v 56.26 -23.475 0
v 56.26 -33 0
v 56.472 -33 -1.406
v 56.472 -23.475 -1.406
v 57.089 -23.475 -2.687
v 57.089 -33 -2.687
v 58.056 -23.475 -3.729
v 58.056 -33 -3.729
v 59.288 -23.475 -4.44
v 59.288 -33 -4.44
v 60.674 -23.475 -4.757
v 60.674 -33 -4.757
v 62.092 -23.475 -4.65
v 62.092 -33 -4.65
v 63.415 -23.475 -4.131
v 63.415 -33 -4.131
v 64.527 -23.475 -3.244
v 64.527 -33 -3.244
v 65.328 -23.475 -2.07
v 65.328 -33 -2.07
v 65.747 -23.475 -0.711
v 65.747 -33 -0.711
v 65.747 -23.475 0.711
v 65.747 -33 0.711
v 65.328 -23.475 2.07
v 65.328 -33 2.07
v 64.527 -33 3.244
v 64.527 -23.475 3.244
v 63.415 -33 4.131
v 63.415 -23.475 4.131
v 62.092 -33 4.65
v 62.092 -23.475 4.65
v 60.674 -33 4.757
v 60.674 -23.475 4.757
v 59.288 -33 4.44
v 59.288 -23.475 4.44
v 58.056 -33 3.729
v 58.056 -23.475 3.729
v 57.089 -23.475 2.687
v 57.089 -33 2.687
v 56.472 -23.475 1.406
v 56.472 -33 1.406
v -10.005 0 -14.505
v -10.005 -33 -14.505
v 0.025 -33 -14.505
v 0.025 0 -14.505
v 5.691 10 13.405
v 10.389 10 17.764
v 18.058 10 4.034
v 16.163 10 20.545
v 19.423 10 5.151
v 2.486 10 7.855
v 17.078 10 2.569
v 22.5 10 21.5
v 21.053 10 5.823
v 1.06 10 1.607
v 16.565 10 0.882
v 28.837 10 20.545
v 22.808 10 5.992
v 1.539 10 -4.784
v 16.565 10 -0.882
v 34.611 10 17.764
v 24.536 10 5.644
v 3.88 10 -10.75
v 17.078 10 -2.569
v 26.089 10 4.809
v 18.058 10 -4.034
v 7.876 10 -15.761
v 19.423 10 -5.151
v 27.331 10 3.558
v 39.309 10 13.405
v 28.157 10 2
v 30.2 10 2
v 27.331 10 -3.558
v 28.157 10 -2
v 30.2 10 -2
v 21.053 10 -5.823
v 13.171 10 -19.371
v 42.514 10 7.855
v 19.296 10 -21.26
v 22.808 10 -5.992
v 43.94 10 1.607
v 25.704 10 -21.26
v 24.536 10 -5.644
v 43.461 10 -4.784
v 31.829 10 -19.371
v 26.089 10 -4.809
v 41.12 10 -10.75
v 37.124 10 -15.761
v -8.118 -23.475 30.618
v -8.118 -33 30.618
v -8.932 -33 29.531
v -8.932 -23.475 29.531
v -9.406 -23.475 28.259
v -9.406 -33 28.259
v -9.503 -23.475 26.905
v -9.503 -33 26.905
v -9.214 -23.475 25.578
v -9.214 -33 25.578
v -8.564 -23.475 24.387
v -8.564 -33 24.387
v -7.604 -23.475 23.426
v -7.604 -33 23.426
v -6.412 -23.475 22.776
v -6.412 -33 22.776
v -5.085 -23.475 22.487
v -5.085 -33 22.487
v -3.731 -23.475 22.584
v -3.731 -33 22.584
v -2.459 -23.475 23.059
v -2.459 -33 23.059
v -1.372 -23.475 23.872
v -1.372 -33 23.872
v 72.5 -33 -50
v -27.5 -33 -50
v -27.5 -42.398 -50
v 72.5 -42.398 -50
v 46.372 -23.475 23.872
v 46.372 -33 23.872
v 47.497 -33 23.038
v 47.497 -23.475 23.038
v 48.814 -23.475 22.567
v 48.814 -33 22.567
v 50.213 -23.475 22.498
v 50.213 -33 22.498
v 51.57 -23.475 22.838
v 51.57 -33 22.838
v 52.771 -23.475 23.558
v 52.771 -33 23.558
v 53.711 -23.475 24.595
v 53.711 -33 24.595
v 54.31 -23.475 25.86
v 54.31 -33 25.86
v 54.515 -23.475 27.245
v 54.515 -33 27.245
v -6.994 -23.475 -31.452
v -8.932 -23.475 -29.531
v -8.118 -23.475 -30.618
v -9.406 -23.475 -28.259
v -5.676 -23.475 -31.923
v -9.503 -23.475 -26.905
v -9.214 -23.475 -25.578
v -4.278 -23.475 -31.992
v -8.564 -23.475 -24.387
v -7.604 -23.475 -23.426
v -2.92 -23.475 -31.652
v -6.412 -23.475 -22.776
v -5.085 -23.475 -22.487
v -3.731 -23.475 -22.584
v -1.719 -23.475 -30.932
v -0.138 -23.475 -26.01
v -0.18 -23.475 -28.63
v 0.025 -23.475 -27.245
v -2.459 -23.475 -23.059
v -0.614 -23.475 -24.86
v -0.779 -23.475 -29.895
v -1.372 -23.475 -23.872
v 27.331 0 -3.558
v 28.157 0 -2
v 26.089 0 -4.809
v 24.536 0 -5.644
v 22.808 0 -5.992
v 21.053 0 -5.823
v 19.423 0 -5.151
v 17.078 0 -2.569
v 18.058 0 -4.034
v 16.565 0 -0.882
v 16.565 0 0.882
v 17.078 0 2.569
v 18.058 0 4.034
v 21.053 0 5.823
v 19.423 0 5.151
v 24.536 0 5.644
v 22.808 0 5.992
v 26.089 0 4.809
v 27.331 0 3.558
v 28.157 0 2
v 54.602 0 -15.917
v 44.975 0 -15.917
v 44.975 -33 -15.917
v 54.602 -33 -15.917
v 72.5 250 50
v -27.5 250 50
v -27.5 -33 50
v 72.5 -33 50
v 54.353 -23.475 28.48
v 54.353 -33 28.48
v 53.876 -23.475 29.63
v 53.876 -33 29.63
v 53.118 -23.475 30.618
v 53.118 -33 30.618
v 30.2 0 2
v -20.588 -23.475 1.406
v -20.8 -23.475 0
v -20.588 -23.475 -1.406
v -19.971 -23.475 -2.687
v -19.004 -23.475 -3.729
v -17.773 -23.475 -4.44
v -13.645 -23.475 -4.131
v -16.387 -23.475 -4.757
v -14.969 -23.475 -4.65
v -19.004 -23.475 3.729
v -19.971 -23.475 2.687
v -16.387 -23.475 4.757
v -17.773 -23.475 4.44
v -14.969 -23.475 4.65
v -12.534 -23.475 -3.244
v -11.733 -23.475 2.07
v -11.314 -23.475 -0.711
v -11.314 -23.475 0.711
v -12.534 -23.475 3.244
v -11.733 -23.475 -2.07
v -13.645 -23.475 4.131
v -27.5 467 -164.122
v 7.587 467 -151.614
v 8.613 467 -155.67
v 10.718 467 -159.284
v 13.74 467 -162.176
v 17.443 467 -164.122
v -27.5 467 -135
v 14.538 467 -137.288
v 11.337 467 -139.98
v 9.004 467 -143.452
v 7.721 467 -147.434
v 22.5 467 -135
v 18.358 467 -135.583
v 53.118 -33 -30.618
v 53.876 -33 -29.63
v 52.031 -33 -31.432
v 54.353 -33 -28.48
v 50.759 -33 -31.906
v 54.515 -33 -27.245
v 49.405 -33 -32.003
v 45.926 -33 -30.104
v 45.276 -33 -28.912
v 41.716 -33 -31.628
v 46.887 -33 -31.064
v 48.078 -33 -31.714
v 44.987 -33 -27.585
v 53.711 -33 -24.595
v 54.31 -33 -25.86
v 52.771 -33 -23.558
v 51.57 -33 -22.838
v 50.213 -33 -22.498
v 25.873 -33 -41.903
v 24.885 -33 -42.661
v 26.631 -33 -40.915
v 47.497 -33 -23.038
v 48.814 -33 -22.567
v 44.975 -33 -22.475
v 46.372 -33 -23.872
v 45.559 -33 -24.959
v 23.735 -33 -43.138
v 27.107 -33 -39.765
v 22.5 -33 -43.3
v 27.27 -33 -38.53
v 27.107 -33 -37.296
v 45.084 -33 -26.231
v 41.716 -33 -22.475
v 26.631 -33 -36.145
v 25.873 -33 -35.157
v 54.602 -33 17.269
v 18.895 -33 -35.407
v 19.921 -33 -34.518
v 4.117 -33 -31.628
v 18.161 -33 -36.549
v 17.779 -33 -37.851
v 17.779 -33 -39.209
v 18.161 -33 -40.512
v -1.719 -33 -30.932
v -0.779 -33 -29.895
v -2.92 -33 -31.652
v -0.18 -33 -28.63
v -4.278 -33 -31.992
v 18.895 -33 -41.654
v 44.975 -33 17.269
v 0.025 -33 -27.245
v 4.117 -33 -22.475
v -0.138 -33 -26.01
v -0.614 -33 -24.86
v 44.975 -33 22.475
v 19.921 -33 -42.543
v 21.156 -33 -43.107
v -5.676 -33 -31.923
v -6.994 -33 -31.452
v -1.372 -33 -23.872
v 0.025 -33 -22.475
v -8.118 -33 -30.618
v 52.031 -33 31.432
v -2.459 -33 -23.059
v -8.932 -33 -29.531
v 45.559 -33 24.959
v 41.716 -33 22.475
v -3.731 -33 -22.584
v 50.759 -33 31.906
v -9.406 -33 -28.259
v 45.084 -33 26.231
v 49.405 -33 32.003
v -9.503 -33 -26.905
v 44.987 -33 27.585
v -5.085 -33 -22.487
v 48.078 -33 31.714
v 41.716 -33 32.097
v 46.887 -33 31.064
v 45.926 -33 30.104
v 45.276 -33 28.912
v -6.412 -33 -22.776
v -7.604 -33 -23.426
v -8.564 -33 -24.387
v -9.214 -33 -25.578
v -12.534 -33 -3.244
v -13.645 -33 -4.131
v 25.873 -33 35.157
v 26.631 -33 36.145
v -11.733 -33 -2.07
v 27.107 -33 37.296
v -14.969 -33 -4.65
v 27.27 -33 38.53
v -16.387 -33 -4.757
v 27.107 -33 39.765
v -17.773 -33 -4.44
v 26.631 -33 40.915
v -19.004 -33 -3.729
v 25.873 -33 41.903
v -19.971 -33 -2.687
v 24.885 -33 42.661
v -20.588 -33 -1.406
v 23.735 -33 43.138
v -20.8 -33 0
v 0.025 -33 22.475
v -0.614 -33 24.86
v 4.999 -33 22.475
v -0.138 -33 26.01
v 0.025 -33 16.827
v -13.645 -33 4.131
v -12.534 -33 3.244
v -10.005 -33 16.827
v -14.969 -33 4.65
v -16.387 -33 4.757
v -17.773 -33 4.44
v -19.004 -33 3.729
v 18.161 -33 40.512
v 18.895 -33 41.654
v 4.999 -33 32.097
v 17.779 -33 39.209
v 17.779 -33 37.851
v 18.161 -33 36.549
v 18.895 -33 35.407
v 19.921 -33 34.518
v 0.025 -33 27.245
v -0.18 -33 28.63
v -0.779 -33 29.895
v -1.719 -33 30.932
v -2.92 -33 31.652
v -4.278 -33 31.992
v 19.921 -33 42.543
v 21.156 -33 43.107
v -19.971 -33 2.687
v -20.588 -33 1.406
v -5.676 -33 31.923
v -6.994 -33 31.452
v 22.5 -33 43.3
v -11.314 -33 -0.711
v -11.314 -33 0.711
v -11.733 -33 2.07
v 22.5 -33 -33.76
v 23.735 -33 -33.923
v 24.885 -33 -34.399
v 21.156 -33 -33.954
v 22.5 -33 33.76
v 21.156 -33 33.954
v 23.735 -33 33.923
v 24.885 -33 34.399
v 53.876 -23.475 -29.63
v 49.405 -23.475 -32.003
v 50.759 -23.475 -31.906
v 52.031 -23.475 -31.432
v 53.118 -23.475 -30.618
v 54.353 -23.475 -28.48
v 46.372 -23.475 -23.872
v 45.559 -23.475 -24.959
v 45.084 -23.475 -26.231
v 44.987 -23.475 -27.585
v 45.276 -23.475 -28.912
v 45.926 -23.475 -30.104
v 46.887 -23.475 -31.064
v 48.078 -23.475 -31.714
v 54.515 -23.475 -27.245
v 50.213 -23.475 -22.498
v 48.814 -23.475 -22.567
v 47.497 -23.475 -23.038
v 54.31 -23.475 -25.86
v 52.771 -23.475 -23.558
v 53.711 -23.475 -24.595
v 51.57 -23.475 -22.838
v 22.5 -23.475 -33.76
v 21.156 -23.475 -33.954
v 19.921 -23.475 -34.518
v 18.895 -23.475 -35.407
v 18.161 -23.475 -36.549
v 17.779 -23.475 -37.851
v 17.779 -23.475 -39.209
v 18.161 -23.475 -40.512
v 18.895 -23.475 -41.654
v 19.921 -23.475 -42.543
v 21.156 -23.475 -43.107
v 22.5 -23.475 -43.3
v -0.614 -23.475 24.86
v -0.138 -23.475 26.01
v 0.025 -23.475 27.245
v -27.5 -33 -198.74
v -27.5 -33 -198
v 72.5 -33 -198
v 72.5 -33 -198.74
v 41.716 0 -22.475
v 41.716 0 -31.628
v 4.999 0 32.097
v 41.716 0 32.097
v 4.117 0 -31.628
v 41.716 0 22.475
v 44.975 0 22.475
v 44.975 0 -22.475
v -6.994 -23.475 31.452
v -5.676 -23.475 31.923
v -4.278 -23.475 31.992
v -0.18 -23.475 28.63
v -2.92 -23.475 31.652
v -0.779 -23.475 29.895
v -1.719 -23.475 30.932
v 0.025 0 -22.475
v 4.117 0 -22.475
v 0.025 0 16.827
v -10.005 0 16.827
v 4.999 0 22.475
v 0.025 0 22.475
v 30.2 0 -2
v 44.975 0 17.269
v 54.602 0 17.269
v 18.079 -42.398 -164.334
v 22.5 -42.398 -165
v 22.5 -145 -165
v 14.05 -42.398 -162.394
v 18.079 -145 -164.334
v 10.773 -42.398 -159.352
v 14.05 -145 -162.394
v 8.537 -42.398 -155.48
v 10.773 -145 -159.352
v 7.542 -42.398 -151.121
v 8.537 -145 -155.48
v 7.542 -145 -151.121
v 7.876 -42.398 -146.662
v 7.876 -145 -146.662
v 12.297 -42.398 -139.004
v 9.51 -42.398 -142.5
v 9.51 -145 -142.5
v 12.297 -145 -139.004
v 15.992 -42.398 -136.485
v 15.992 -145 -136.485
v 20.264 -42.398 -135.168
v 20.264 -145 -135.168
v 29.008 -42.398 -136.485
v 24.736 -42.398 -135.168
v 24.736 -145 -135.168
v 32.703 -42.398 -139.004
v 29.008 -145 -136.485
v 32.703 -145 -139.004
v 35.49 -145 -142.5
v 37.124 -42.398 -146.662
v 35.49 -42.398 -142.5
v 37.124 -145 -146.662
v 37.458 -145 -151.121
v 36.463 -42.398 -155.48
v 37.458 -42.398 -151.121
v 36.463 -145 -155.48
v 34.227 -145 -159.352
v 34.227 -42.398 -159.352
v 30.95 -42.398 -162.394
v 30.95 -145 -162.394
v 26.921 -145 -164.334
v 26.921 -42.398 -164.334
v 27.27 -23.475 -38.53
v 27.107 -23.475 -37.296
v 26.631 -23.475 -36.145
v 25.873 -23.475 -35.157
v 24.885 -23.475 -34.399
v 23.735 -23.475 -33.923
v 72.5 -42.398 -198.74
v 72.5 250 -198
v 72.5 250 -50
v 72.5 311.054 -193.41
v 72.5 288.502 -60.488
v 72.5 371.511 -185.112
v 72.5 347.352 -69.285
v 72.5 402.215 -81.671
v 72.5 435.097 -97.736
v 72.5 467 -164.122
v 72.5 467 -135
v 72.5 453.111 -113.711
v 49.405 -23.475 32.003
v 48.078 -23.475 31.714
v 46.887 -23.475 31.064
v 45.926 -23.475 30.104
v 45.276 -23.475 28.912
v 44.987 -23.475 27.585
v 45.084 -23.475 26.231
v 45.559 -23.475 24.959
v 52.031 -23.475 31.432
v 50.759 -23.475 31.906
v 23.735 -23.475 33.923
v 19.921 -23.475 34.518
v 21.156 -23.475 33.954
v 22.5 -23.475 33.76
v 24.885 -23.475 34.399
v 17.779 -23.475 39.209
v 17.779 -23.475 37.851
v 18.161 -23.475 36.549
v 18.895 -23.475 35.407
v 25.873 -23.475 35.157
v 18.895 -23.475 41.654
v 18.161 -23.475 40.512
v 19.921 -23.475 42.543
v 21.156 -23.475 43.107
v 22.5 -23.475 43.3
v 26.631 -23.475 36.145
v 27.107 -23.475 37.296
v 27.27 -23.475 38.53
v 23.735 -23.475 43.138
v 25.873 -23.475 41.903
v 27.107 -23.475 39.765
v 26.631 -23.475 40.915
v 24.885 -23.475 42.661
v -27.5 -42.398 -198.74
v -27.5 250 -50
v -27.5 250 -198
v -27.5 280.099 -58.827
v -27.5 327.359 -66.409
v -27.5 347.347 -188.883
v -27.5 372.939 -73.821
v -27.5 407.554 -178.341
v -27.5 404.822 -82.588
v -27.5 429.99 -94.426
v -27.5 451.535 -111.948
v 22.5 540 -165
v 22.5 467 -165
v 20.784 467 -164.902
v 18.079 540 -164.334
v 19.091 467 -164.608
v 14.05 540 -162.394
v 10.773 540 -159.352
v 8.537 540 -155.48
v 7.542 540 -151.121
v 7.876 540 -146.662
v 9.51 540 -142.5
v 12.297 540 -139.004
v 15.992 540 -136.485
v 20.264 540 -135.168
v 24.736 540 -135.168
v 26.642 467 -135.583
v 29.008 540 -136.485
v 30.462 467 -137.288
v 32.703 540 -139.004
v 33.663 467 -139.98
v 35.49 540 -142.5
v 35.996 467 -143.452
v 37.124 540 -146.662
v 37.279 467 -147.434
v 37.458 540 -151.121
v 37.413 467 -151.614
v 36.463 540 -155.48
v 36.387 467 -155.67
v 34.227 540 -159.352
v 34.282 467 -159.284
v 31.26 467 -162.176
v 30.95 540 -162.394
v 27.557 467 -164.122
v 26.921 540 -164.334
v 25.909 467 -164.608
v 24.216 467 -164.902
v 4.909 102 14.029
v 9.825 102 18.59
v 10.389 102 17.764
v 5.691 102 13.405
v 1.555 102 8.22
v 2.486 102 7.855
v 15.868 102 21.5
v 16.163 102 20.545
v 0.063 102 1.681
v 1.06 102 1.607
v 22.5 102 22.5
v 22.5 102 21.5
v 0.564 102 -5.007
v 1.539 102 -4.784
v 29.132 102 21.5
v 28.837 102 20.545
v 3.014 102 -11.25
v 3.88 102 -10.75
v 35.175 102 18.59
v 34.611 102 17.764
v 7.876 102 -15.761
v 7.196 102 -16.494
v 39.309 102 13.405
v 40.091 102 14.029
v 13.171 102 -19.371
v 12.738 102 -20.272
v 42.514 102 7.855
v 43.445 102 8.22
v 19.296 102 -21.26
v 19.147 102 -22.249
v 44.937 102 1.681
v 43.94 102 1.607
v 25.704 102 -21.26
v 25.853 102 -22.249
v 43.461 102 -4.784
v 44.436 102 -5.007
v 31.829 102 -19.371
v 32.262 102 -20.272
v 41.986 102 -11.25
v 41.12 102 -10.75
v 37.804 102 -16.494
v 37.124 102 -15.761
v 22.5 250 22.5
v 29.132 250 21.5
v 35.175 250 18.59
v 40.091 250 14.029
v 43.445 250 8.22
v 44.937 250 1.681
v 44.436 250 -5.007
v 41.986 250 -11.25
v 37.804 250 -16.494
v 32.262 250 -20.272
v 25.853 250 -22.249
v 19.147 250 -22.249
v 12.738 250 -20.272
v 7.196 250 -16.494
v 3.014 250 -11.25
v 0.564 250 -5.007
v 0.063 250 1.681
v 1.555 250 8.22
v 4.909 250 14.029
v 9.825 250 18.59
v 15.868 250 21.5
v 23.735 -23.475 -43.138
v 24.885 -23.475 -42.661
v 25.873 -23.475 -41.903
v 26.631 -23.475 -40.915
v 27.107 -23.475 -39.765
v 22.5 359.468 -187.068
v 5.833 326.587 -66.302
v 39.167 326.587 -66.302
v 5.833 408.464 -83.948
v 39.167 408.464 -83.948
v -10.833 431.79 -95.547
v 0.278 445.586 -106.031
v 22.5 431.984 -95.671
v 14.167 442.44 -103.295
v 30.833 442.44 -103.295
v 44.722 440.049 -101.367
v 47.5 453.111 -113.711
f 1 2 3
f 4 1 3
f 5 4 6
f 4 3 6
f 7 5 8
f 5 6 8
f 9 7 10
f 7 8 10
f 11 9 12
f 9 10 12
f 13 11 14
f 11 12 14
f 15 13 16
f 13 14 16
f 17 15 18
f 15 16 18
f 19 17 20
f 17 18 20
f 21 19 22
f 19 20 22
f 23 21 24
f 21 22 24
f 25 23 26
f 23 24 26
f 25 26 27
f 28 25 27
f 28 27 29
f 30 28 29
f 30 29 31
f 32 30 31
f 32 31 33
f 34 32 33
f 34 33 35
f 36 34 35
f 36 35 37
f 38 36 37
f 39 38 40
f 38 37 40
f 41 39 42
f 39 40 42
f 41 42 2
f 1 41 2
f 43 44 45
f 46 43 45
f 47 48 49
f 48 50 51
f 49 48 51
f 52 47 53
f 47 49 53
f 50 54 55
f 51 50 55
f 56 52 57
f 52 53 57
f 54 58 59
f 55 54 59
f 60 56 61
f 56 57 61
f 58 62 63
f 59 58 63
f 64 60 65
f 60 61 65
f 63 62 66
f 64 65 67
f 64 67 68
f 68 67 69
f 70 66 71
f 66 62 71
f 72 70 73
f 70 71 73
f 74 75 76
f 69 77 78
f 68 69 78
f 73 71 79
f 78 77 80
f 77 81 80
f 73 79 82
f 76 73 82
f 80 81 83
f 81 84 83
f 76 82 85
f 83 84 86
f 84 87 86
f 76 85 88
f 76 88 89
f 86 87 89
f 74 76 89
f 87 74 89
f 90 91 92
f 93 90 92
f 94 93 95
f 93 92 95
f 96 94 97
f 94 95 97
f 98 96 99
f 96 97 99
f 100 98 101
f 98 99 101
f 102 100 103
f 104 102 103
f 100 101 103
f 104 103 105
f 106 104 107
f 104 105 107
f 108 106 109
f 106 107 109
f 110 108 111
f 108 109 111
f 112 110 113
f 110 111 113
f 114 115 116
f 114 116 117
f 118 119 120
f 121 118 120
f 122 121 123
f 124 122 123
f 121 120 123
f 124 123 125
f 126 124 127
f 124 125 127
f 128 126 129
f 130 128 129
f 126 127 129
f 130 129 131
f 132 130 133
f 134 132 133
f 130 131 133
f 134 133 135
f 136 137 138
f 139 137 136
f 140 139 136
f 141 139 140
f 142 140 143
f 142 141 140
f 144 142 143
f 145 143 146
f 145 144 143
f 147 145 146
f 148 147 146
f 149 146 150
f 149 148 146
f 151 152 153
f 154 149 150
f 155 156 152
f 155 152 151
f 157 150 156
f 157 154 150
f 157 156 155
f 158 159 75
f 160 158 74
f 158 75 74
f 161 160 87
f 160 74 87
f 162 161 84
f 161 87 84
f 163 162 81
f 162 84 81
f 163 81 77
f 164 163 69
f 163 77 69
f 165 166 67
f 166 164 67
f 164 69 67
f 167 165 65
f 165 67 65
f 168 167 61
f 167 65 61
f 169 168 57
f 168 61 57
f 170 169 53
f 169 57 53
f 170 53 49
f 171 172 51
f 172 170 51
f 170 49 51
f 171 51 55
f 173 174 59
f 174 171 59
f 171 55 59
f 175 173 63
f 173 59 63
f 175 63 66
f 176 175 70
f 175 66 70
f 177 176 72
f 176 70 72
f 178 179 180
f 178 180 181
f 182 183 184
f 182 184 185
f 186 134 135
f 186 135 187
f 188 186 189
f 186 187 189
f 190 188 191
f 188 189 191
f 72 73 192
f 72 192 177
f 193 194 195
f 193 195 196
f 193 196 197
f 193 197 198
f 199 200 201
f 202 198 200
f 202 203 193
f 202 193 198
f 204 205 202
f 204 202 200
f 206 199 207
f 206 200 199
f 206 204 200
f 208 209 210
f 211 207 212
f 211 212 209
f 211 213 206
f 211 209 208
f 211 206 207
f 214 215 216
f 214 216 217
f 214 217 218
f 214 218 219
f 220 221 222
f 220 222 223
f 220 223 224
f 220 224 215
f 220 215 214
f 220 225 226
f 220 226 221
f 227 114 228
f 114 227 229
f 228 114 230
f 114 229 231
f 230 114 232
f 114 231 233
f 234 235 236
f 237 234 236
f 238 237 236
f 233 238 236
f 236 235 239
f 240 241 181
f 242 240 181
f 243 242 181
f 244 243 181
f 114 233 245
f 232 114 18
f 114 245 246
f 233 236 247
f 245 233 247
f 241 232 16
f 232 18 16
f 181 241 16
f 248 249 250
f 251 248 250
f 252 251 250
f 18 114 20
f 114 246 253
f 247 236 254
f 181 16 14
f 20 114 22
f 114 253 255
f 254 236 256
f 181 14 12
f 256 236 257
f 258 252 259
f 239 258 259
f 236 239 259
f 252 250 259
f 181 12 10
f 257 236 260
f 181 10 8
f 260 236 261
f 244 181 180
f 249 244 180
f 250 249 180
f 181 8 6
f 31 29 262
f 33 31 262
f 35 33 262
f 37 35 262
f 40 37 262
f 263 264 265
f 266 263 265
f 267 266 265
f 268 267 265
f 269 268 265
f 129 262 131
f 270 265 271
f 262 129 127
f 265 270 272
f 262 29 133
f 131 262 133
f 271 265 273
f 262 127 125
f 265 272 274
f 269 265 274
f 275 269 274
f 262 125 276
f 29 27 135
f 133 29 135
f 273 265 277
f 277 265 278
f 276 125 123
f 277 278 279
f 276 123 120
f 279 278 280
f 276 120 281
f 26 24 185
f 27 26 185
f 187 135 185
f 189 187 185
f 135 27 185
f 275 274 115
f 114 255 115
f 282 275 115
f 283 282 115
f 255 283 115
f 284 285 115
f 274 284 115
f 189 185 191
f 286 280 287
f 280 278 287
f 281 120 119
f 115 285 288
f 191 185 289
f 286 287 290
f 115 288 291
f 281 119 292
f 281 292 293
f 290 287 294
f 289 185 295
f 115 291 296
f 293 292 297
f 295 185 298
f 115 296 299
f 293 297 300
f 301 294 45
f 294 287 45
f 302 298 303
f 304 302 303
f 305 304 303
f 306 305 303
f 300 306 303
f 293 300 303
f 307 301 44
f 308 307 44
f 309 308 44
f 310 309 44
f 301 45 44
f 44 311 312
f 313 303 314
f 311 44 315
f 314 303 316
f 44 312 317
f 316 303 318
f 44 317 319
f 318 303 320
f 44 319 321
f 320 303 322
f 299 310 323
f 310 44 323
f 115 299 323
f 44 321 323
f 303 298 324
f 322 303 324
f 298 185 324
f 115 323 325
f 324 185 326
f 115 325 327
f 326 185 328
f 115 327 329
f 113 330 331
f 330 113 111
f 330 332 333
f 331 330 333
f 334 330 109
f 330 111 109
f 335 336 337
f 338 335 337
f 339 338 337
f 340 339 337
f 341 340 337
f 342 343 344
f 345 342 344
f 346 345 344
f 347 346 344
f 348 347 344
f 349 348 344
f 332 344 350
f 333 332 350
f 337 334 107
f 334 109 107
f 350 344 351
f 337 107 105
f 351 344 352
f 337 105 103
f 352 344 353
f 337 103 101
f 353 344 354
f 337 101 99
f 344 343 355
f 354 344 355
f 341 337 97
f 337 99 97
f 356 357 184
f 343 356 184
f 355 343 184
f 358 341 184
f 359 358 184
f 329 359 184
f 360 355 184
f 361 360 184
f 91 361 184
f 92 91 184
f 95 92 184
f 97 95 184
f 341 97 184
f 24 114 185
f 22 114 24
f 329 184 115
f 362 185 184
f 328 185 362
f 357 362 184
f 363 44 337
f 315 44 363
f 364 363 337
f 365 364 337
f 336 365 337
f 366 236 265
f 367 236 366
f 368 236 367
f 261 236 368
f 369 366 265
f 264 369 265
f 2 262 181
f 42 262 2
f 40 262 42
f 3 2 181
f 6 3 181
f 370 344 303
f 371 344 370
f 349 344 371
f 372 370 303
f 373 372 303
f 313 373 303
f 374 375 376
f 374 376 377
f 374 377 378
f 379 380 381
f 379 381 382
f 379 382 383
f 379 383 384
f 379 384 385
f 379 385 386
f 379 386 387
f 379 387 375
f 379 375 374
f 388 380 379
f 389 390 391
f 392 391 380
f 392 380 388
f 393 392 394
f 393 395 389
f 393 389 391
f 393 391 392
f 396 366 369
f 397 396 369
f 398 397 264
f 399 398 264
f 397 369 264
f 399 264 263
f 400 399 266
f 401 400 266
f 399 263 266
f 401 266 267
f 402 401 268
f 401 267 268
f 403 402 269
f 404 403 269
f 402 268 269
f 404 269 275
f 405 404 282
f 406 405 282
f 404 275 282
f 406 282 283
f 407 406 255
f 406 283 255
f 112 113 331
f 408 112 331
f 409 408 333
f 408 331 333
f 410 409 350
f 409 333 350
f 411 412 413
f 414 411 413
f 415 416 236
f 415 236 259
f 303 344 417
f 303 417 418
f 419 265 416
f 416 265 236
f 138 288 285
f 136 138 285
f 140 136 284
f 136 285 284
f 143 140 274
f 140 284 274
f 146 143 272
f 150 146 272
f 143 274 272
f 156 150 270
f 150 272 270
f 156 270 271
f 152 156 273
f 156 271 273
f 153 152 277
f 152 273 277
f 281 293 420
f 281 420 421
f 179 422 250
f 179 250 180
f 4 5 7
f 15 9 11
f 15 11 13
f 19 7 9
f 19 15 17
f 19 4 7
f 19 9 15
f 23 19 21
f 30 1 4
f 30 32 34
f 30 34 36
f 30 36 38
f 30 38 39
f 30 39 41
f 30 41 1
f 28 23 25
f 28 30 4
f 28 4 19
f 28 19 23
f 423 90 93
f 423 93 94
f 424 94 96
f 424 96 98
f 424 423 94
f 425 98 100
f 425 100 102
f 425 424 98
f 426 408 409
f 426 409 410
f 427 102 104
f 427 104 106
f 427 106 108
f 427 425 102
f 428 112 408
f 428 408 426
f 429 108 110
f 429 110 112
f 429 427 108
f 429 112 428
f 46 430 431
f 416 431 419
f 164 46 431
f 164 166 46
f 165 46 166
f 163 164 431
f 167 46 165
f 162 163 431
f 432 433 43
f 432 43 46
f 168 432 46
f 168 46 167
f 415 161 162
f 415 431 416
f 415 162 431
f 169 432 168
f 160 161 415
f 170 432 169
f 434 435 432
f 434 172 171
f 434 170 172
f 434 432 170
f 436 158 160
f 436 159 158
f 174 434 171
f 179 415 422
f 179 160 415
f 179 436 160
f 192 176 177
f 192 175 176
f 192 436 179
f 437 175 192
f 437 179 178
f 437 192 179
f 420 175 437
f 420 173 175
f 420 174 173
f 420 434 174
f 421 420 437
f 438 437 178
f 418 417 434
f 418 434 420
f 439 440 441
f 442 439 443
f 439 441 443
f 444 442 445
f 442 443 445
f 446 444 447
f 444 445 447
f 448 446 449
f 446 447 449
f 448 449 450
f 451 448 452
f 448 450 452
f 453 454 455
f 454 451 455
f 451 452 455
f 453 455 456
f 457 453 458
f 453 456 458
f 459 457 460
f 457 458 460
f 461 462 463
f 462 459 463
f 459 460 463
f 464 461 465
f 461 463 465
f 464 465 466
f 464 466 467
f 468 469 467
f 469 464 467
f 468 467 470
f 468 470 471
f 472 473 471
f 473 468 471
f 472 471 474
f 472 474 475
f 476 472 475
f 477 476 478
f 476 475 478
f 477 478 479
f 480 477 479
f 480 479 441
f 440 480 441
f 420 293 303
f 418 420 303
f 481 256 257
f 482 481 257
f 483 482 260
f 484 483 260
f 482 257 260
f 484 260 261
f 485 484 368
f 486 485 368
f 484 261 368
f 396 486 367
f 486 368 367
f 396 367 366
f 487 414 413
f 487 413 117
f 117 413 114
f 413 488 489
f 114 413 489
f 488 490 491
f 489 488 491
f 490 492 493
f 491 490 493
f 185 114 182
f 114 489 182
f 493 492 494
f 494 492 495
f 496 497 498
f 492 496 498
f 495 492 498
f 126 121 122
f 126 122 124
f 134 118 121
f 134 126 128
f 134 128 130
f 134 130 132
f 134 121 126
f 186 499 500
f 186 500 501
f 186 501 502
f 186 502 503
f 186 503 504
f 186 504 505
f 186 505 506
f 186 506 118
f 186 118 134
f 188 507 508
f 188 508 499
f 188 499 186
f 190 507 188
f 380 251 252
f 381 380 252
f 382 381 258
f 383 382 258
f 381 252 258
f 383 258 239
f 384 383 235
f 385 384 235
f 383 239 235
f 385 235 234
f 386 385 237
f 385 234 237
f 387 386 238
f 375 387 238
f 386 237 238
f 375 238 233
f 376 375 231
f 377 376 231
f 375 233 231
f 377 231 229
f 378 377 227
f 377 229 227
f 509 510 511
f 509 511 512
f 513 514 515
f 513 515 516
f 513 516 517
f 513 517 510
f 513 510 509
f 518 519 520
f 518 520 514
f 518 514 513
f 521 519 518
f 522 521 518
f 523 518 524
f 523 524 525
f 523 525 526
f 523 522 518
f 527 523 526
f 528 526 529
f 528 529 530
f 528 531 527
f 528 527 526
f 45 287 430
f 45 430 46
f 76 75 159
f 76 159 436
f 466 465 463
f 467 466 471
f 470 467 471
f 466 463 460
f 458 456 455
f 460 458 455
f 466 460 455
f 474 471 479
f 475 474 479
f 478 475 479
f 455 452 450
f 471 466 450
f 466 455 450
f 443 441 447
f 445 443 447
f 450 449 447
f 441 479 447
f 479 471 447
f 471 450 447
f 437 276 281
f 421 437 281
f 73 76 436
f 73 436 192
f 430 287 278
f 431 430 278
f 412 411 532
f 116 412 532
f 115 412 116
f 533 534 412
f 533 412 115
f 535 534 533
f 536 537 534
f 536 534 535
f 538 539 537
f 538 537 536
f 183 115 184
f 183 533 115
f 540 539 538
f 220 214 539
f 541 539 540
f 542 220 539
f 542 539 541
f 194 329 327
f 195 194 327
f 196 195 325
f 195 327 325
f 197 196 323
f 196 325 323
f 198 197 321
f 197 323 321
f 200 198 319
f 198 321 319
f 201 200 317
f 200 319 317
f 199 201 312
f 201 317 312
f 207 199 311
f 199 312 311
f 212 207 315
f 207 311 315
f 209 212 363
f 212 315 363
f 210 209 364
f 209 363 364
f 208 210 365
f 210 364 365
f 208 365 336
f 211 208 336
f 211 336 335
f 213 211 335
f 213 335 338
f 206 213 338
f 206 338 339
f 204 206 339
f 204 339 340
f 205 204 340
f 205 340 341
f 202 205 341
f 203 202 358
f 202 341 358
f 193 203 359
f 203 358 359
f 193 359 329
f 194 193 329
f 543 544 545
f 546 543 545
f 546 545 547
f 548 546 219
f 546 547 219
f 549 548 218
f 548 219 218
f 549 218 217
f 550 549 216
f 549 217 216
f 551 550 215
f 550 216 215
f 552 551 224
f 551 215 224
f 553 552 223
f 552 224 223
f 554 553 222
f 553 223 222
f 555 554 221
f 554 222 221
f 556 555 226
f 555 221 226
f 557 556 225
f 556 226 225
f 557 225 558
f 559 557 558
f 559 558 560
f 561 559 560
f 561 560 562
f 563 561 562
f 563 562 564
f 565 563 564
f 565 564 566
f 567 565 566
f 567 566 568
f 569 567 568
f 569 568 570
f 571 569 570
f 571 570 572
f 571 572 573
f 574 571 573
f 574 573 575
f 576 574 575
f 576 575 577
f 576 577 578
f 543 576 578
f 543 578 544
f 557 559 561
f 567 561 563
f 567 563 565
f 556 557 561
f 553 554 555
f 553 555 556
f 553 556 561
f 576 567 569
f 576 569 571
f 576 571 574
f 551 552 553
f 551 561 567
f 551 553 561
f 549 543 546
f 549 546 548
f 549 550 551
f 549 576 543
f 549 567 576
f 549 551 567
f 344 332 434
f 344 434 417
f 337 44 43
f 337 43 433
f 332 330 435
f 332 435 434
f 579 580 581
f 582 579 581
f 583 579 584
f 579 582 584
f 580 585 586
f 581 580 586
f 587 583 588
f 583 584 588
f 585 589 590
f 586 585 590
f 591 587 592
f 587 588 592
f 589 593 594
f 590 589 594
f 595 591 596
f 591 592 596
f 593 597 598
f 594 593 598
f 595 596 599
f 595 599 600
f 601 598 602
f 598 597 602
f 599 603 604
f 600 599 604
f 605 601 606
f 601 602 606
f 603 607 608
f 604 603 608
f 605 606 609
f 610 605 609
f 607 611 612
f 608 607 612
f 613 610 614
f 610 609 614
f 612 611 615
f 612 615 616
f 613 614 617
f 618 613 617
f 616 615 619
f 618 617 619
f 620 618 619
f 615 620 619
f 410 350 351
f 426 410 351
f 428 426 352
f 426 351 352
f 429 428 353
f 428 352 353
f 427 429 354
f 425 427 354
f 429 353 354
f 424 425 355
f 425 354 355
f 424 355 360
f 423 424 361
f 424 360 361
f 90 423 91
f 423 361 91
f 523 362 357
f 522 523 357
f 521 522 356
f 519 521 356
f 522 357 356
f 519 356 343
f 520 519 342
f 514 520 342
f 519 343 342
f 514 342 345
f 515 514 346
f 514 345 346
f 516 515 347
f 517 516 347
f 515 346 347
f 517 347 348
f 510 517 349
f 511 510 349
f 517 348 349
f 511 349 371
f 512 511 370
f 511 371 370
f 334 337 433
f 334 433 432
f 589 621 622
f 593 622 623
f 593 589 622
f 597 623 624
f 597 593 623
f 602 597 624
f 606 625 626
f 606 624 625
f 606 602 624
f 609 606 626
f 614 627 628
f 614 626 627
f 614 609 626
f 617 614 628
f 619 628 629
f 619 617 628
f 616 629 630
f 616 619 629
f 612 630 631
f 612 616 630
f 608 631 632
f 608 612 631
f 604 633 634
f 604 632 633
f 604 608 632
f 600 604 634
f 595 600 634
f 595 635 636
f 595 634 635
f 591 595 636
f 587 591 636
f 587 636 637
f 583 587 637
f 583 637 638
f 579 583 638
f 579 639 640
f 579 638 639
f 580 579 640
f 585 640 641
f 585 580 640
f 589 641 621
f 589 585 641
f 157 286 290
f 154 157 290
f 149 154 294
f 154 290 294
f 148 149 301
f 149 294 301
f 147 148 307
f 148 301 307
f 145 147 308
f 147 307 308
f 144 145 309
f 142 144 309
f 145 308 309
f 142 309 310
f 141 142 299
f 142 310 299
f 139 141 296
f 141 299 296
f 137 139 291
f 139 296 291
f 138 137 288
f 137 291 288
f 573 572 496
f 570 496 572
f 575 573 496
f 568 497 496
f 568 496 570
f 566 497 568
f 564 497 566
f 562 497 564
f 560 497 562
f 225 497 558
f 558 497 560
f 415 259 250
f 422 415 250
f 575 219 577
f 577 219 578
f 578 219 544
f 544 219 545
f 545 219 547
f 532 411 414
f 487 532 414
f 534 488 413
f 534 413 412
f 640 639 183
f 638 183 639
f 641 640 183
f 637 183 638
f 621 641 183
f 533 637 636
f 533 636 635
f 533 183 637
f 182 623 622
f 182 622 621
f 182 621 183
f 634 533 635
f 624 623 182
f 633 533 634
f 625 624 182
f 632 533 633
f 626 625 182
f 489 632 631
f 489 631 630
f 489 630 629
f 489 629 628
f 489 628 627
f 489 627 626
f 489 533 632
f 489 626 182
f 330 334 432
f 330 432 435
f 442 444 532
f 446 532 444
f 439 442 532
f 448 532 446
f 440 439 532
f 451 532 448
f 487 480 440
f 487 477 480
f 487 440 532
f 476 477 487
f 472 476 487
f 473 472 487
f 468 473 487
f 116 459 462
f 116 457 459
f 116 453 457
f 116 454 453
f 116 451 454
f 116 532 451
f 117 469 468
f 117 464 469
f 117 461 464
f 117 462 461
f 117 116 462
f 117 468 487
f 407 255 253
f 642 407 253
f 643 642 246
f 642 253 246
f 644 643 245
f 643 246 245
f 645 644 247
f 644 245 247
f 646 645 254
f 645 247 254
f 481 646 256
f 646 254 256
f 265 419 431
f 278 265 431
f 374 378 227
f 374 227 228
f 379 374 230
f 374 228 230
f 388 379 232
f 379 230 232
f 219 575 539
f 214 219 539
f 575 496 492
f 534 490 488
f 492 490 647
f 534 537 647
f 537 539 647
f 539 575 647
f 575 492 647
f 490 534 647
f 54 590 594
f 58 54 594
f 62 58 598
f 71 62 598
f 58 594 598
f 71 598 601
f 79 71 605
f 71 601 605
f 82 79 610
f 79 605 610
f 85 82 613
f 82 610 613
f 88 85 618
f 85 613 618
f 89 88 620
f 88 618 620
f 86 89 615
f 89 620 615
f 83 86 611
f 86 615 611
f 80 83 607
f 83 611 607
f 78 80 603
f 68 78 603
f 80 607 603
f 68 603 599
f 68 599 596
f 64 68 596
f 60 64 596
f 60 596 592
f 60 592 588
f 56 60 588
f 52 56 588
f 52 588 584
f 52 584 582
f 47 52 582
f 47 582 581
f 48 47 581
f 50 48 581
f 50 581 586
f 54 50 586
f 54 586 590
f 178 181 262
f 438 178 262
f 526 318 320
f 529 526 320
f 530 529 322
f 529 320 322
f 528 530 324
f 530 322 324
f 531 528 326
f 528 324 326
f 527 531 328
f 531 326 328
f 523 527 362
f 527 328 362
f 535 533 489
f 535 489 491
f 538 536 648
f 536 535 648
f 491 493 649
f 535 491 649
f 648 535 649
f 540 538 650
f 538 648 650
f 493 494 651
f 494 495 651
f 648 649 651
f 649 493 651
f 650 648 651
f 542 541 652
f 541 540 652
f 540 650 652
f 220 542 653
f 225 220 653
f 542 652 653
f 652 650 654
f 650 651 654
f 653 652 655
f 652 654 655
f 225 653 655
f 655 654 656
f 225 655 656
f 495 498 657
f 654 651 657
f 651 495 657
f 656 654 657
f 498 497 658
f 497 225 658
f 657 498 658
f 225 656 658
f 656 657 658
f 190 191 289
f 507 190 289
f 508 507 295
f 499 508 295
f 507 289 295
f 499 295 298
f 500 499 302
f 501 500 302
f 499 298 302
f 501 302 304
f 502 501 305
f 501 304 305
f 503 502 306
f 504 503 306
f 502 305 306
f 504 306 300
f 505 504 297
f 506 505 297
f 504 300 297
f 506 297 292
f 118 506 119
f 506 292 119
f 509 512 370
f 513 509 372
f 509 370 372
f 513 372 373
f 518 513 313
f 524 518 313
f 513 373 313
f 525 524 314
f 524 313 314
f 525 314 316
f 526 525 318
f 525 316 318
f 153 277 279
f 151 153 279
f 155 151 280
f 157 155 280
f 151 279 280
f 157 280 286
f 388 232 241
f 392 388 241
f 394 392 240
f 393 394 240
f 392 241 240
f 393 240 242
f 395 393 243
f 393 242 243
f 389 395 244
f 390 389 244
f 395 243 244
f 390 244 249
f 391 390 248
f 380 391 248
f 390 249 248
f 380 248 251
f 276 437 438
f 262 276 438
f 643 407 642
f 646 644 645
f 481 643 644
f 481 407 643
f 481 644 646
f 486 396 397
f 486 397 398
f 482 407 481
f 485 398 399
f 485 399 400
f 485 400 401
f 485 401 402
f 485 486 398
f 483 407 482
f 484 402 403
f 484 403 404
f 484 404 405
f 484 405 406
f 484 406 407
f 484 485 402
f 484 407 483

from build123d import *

# Parameters (mm, degrees)
CUT_EXTRUDE_START     = -10
CUT_EXTRUDE_1_DEPTH   = 10
EXTRUDE_START         = -250
SKETCH_3_R            = 50
SKETCH_3_R_2          = 32.5
EXTRUDE_1_DEPTH       = 250
EXTRUDE_7_DEPTH       = 250
EXTRUDE_8_DEPTH       = 50
EXTRUDE_8_DEPTH_BACK  = 50
SKETCH_5_R            = 4.77
CUT_EXTRUDE_2_DEPTH   = 9.525
CUT_EXTRUDE_5_DEPTH   = 33
SKETCH_12_W           = 100
SKETCH_12_H           = 500
EXTRUDE_10_DEPTH      = 148
EXTRUDE_12_DEPTH      = 73
EXTRUDE_12_DEPTH_BACK = 612
SKETCH_13_R           = 15
CUT_EXTRUDE_4_DEPTH   = 239
SKETCH_16_W           = 100
SKETCH_16_H           = 148.739556464
EXTRUDE_15_DEPTH      = 9.398


with BuildPart() as part:
    # 草图1 → 旋转1 (revolve)
    with BuildSketch(Plane.XY):
        Polygon((16.5, 10), (1, 10), (1, 102), (0, 102), (0, 250), (-10, 250), (-10, 0), (16.5, 0), align=None)
        Polygon((28.5, 10), (28.5, 0), (55, 0), (55, 250), (45, 250), (45, 102), (44, 102), (44, 10), align=None)
    revolve(axis=Axis((22.5, 0, 0), (0, 1, 0)))

    # 草图2 → 切除-拉伸1 (cut)
    with BuildSketch(Plane.XZ.offset(CUT_EXTRUDE_START)):
        with BuildLine():
            Line((30.2, 2), (28.156854249, 2))
            ThreePointArc((28.156854249, 2), (28.5, 0), (28.156854249, -2))
            Line((28.156854249, -2), (30.2, -2))
            Line((30.2, -2), (30.2, 2))
        make_face()
    extrude(amount=CUT_EXTRUDE_1_DEPTH, mode=Mode.SUBTRACT)

    # 草图3 → 凸台-拉伸1 (add)
    with BuildSketch(Plane(origin=(0, 250, 0), x_dir=(1, 0, 0), z_dir=(0, 1, 0)).offset(EXTRUDE_START)):
        with Locations((22.5, 0)):
            Circle(SKETCH_3_R)
        with Locations((22.5, 0)):
            Circle(SKETCH_3_R_2, mode=Mode.SUBTRACT)
    extrude(amount=EXTRUDE_1_DEPTH)

    # 草图3<5> → 凸台-拉伸7 (add)
    with BuildSketch(Plane(origin=(0, 250, 0), x_dir=(1, 0, 0), z_dir=(0, 1, 0)).offset(EXTRUDE_START)):
        with BuildLine():
            ThreePointArc((22.5, -50), (-12.855339059, -35.355339059), (-27.5, 0))
            Line((-27.5, 0), (-27.5, -50))
            Line((-27.5, -50), (22.5, -50))
        make_face()
        with BuildLine():
            Line((-27.5, 50), (-27.5, 0))
            ThreePointArc((-27.5, 0), (-12.855339059, 35.355339059), (22.5, 50))
            Line((22.5, 50), (-27.5, 50))
        make_face()
        with BuildLine():
            Line((72.5, 50), (22.5, 50))
            ThreePointArc((22.5, 50), (57.855339059, 35.355339059), (72.5, 0))
            Line((72.5, 0), (72.5, 50))
        make_face()
        with BuildLine():
            ThreePointArc((72.5, 0), (57.855339059, -35.355339059), (22.5, -50))
            Line((22.5, -50), (72.5, -50))
            Line((72.5, -50), (72.5, 0))
        make_face()
    extrude(amount=EXTRUDE_7_DEPTH)

    # 草图1<21> → 凸台-拉伸8 (add, two sides: drawn at the far end of the back side and taken through both)
    with BuildSketch(Plane.XY.offset(-EXTRUDE_8_DEPTH_BACK)):
        Polygon((16.5, 0), (0, 0), (-10, 0), (-27.5, 0), (-27.5, -33), (72.5, -33), (72.5, 0), (55, 0), (45, 0), (28.5, 0), align=None)
    extrude(amount=EXTRUDE_8_DEPTH + EXTRUDE_8_DEPTH_BACK)

    # 草图5 → 切除-拉伸2 (cut)
    with BuildSketch(Plane.XZ.offset(33)):
        with Locations((-16.030339059, 0)):
            Circle(SKETCH_5_R)
        with Locations((-4.74506403, 27.24506403)):
            Circle(SKETCH_5_R)
        with Locations((22.5, 38.530339059)):
            Circle(SKETCH_5_R)
        with Locations((49.74506403, 27.24506403)):
            Circle(SKETCH_5_R)
        with Locations((61.030339059, 0)):
            Circle(SKETCH_5_R)
        with Locations((49.74506403, -27.24506403)):
            Circle(SKETCH_5_R)
        with Locations((22.5, -38.530339059)):
            Circle(SKETCH_5_R)
        with Locations((-4.74506403, -27.24506403)):
            Circle(SKETCH_5_R)
    extrude(amount=-CUT_EXTRUDE_2_DEPTH, mode=Mode.SUBTRACT)

    # 草图7 → 切除-拉伸5 (cut)
    with BuildSketch(Plane.XZ.offset(33)):
        Polygon((44.97506403, 22.47506403), (41.715776468, 22.47506403), (41.715776468, 32.096637168), (4.999147853, 32.096637168), (4.999147853, 22.47506403), (0.02493597, 22.47506403), (0.02493597, 16.827462287), (-10.005243648, 16.827462287), (-10.005243648, -14.505237612), (0.02493597, -14.505237612), (0.02493597, -22.47506403), (4.116536589, -22.47506403), (4.116536589, -31.627896149), (41.715776468, -31.627896149), (41.715776468, -22.47506403), (44.97506403, -22.47506403), (44.97506403, -15.917415636), (54.601900934, -15.917415636), (54.601900934, 17.26876792), (44.97506403, 17.26876792), align=None)
    extrude(amount=-CUT_EXTRUDE_5_DEPTH, mode=Mode.SUBTRACT)

    # 草图12 → 凸台-拉伸10 (add)
    with BuildSketch(Plane(origin=(0, 0, -50), x_dir=(-1, 0, 0), z_dir=(0, 0, -1))):
        with Locations((-22.5, 217)):
            Rectangle(SKETCH_12_W, SKETCH_12_H)
    extrude(amount=EXTRUDE_10_DEPTH)

    # 草图13 → 凸台-拉伸12 (add, two sides: drawn at the far end of the back side and taken through both)
    with BuildSketch(Plane(origin=(0, 467, 0), x_dir=(1, 0, 0), z_dir=(0, 1, 0)).offset(-EXTRUDE_12_DEPTH_BACK)):
        with Locations((22.5, 150)):
            Circle(SKETCH_13_R)
    extrude(amount=EXTRUDE_12_DEPTH + EXTRUDE_12_DEPTH_BACK)

    # 草图14 → 切除-拉伸4 (cut)
    with BuildSketch(Plane(origin=(72.5, 0, 0), x_dir=(0, 0, -1), z_dir=(1, 0, 0))):
        with BuildLine():
            Line((50, 250), (50, 467))
            Line((50, 467), (135, 467))
            add(Edge.make_bspline(
                [(50, 250), (76.315551246, 314.396639374), (56.559615793, 429.68013341), (135, 467)],
                knots=[0, 0, 0, 0, 1, 1, 1, 1], degree=3))
        make_face()
        with BuildLine():
            Line((164.121808583, 467), (198, 467))
            Line((198, 467), (198, 250))
            add(Edge.make_bspline(
                [(164.121808583, 467), (193.074894333, 360.435548365), (198, 250)],
                knots=[0, 0, 0, 1, 1, 1], degree=2))
        make_face()
    extrude(amount=-CUT_EXTRUDE_4_DEPTH, mode=Mode.SUBTRACT)

    # 草图16 → 凸台-拉伸15 (add)
    with BuildSketch(Plane.XZ.offset(33)):
        with Locations((22.5, -124.369778232)):
            Rectangle(SKETCH_16_W, SKETCH_16_H)
    extrude(amount=EXTRUDE_15_DEPTH)


solid = part.part
